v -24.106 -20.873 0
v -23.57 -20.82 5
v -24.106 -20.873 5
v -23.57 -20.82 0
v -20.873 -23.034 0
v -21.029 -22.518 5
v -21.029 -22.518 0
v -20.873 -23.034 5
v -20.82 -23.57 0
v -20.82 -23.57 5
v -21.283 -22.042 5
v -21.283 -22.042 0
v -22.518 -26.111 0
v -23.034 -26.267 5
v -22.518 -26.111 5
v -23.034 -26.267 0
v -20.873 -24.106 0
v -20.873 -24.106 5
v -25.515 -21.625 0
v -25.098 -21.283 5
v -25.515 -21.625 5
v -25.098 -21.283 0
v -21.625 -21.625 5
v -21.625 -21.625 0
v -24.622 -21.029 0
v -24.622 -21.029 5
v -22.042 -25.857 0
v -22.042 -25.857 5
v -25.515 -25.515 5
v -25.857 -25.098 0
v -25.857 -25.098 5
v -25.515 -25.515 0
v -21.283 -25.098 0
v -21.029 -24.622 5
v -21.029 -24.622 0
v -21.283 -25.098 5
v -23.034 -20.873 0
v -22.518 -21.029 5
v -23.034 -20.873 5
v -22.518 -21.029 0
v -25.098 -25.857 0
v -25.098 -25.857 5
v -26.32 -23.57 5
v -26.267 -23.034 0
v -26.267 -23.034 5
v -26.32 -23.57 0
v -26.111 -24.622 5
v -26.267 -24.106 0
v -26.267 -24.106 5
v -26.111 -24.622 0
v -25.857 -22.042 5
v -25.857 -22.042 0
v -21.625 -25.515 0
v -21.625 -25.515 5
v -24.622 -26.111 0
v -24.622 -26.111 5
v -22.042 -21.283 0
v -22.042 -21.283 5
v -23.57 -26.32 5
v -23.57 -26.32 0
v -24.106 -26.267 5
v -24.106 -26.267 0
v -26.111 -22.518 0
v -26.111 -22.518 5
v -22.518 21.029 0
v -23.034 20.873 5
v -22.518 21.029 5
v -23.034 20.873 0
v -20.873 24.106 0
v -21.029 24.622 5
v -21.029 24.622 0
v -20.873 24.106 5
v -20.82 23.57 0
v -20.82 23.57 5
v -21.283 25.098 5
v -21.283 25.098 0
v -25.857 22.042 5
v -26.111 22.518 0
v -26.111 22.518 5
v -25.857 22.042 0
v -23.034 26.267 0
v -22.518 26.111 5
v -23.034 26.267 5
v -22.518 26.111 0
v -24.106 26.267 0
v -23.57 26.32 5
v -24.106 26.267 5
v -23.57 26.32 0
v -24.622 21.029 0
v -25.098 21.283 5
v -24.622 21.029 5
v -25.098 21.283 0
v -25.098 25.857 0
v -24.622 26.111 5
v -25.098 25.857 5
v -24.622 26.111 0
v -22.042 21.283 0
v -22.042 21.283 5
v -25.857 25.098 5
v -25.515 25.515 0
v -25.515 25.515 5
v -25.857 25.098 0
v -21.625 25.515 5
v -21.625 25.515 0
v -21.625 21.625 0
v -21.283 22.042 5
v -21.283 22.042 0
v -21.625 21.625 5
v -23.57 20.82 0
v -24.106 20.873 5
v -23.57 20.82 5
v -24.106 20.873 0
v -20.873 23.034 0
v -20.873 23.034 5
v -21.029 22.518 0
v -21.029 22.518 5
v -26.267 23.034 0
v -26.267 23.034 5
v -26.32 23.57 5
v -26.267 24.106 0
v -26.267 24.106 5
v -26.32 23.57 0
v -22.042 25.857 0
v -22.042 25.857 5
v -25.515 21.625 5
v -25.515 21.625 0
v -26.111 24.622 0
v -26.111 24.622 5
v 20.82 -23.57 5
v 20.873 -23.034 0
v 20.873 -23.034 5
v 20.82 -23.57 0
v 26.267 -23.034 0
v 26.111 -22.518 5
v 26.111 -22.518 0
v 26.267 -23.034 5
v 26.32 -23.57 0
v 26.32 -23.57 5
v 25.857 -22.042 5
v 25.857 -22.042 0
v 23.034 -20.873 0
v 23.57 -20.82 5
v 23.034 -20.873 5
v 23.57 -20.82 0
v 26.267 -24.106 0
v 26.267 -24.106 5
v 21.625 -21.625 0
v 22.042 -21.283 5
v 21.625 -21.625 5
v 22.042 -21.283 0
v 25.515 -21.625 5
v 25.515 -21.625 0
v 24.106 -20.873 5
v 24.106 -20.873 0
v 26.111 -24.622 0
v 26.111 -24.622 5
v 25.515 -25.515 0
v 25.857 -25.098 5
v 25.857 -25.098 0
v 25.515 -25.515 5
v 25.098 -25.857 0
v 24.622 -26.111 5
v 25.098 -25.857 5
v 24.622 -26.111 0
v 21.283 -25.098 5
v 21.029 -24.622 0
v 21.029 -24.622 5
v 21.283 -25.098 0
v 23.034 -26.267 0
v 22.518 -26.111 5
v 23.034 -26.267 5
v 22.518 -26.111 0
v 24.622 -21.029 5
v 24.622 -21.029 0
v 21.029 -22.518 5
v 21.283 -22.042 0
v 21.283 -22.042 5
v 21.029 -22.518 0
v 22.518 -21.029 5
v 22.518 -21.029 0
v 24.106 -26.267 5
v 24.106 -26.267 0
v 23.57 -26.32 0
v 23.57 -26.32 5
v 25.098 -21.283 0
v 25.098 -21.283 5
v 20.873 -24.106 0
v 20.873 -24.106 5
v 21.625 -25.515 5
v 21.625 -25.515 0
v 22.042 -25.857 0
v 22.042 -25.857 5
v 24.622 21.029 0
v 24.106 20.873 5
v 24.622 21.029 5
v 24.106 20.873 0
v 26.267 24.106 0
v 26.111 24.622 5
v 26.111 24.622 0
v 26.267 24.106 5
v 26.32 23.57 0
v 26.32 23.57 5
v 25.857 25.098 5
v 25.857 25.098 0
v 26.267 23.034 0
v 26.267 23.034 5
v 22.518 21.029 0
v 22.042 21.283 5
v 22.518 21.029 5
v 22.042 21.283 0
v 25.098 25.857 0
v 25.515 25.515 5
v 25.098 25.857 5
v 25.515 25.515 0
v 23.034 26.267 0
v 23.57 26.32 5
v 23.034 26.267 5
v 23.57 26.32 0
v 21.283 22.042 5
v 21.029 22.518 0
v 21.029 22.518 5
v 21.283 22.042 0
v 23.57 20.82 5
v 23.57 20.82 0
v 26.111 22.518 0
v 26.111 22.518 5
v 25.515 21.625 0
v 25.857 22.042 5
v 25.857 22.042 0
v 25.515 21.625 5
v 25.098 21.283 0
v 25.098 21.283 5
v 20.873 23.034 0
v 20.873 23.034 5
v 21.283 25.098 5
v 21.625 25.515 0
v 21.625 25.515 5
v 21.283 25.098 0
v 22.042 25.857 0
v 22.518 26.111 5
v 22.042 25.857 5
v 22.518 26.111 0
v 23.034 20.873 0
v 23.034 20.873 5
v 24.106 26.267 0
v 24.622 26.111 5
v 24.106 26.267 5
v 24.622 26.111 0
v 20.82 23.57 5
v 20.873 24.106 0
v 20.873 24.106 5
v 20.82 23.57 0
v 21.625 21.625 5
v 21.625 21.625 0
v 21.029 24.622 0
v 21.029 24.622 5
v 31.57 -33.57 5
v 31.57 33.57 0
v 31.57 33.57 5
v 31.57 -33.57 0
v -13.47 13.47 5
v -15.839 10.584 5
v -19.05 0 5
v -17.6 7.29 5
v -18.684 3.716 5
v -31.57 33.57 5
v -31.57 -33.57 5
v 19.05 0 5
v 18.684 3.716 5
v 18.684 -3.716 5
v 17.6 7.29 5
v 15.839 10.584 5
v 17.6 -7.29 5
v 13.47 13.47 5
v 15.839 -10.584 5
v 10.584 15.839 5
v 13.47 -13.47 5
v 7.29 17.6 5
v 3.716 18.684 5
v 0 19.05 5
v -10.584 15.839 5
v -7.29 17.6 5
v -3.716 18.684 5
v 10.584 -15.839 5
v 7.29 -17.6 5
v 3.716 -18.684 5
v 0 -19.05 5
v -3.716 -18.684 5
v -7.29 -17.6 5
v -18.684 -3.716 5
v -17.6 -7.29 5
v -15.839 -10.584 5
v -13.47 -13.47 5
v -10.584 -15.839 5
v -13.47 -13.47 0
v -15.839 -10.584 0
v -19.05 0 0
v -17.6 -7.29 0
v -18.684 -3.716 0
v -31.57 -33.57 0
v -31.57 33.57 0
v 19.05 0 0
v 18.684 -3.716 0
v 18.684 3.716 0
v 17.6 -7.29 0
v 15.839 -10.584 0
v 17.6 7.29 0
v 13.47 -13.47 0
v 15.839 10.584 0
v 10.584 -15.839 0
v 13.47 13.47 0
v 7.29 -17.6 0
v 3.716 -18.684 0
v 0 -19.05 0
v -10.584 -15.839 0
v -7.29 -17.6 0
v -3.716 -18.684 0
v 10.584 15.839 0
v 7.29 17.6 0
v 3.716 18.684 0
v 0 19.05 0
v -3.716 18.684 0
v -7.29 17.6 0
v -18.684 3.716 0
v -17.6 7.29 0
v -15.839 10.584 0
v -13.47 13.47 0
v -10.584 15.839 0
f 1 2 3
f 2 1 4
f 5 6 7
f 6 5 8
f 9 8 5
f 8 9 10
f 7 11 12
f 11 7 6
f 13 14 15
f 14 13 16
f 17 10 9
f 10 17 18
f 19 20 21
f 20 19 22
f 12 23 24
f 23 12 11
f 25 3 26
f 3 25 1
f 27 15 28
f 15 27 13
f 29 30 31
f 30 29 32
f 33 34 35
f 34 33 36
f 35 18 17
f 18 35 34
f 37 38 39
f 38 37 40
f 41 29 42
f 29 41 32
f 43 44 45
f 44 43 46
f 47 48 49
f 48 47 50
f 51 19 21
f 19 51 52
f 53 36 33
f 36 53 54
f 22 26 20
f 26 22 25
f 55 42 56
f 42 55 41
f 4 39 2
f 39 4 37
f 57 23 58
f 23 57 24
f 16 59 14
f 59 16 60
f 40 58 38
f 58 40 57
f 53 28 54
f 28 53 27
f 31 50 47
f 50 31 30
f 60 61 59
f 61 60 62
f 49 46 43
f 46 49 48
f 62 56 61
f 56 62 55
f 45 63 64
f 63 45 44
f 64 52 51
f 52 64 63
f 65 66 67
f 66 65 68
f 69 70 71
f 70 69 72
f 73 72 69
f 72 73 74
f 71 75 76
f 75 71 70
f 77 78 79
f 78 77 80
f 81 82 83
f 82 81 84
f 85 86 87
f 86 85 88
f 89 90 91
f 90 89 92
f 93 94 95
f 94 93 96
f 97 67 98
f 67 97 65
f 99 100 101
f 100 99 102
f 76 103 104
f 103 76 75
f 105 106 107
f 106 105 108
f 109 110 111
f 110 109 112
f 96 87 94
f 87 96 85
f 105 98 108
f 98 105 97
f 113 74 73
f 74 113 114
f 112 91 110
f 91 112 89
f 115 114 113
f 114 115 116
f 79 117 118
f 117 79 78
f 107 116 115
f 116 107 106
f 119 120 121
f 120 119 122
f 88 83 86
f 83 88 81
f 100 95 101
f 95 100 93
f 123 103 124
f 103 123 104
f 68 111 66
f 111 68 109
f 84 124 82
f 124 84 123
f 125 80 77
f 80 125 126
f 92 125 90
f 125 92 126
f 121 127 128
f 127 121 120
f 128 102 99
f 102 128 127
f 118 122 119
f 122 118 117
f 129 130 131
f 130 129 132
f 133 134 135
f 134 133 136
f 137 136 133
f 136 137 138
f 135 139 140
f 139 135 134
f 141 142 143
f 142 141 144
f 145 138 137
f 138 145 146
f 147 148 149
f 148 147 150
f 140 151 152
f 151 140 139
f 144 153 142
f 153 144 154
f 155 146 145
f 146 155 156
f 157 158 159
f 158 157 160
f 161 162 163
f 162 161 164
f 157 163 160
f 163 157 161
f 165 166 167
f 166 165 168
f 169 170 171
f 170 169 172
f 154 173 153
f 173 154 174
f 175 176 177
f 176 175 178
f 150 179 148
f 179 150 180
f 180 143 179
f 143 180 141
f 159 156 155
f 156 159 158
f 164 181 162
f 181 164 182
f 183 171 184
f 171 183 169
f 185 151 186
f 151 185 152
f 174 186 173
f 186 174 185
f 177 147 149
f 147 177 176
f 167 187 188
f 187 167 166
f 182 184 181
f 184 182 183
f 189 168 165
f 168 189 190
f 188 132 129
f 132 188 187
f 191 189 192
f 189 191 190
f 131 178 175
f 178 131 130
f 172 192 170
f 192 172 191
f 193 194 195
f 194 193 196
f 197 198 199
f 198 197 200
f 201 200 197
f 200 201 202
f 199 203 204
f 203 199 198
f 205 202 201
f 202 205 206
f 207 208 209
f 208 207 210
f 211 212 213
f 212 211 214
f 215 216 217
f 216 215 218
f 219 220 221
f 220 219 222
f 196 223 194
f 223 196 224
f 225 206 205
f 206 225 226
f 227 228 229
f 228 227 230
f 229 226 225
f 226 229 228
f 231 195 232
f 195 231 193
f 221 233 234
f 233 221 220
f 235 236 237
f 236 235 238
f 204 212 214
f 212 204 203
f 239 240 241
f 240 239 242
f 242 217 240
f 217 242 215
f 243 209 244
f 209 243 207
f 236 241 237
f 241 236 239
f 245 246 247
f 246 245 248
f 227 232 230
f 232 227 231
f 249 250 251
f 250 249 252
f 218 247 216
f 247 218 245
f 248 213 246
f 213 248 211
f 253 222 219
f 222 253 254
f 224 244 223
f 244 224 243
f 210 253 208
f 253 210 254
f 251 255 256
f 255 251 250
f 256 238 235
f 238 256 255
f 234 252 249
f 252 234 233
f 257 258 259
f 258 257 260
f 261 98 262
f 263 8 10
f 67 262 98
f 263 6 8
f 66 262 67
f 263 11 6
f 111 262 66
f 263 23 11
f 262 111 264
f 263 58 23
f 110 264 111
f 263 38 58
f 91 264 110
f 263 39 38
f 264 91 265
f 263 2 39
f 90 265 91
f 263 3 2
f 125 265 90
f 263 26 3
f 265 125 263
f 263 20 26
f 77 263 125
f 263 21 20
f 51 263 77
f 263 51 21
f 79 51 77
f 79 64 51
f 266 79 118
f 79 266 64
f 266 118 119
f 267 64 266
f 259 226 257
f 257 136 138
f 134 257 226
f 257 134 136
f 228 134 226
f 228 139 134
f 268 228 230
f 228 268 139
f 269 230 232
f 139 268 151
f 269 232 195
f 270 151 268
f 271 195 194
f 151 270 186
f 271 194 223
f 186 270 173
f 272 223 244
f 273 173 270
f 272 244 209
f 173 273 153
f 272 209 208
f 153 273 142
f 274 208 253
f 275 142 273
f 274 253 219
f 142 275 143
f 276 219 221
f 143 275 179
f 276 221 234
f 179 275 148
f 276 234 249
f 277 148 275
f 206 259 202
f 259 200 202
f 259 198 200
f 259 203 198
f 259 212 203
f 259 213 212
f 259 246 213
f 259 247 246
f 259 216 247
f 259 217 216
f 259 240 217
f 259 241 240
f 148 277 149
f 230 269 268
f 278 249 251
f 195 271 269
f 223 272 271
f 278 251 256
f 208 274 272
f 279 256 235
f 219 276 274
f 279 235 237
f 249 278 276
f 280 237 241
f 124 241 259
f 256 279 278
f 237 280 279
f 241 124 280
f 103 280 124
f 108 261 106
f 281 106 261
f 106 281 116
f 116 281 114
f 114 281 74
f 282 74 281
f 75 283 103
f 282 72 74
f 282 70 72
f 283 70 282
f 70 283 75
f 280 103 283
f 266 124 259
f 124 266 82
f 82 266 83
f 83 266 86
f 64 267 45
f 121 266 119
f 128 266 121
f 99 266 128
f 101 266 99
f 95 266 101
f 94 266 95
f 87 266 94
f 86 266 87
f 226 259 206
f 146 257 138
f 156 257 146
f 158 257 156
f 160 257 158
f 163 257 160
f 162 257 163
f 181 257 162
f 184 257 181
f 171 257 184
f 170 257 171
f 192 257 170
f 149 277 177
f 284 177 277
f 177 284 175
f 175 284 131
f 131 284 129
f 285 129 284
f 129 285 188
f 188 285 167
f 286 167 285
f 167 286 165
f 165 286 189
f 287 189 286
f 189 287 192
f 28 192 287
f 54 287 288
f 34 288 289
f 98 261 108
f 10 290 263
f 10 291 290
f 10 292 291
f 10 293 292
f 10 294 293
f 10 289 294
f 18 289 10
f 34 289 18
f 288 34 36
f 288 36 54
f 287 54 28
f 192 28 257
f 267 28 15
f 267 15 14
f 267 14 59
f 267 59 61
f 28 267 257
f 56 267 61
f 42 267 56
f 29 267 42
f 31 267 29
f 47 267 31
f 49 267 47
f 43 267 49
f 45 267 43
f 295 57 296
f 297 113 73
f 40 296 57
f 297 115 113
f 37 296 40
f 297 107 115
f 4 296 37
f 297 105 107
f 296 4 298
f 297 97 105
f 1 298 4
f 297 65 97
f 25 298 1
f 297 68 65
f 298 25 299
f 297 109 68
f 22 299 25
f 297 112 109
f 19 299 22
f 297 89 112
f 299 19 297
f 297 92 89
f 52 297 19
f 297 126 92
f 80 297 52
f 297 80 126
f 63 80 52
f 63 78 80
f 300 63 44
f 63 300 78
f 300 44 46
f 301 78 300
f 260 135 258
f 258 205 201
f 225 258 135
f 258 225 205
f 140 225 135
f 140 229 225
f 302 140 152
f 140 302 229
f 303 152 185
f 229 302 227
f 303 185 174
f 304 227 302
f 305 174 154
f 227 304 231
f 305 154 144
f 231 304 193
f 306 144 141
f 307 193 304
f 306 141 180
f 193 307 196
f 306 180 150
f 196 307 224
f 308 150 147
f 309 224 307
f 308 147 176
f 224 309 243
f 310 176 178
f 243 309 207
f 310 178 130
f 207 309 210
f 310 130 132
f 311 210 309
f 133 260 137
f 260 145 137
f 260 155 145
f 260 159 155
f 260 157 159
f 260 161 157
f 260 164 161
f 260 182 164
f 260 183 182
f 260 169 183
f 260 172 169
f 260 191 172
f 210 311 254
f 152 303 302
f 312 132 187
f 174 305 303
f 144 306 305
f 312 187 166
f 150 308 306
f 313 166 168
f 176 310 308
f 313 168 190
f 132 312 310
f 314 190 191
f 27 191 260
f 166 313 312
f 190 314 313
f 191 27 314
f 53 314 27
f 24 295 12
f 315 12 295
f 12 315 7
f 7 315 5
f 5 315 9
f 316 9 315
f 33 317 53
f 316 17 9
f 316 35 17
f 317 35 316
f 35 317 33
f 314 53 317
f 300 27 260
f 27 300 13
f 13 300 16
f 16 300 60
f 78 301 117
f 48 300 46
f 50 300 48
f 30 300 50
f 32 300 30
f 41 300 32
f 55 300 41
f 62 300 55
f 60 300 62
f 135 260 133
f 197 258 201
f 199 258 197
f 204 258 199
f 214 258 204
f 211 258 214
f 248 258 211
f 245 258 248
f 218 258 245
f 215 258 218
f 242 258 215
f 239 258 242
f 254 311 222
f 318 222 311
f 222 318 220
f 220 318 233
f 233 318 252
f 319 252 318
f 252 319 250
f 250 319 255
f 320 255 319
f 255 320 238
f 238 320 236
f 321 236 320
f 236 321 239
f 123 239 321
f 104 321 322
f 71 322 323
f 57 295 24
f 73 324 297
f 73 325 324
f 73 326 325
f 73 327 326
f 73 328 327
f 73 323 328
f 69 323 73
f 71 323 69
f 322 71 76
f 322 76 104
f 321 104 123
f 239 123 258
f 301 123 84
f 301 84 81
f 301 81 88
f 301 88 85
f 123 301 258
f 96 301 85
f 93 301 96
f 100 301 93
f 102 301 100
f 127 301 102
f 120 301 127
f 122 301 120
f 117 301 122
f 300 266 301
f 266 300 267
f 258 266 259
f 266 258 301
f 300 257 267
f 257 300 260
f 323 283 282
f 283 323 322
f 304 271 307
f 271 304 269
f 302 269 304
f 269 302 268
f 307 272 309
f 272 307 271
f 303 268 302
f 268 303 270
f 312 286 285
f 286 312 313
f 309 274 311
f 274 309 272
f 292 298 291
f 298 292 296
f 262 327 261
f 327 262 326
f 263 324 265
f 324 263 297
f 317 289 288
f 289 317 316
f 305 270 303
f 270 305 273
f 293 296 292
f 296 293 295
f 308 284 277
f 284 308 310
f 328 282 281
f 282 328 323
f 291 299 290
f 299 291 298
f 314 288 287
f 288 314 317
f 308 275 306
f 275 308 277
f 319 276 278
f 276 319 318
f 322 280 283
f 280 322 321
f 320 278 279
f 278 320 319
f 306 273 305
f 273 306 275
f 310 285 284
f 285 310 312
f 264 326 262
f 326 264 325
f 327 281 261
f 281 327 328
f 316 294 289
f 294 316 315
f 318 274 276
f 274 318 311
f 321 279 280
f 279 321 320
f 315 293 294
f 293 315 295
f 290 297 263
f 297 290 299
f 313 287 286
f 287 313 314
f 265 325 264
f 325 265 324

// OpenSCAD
$fn = 32;

// ----------------------------------------------------------------------
// Motor mount plate: NEMA23, 63.14 x 67.14 x 5 mm
// ----------------------------------------------------------------------

// --- parameters (mm) ---
mount_w = 63.14;          // plate length, X
mount_d = 67.14;          // plate width, Y
mat_t = 5;                // plate thickness
motor_pitch = 47.14;      // NEMA23 bolt spacing
motor_d = 5.5;            // NEMA23 screw clearance
center_bore = 38.1;       // pilot boss bore

module plate() {
  translate([-mount_w / 2, -mount_d / 2, 0]) cube([mount_w, mount_d, mat_t]);
}

module motor_holes() {
  for (sx = [-1, 1]) for (sy = [-1, 1])
    translate([sx * motor_pitch / 2, sy * motor_pitch / 2, -1])
      cylinder(h = mat_t + 2, d = motor_d);
}

difference() {
  union() {
    plate();
  }
  motor_holes();
  translate([0, 0, -1]) cylinder(h = mat_t + 2, d = center_bore);
}
